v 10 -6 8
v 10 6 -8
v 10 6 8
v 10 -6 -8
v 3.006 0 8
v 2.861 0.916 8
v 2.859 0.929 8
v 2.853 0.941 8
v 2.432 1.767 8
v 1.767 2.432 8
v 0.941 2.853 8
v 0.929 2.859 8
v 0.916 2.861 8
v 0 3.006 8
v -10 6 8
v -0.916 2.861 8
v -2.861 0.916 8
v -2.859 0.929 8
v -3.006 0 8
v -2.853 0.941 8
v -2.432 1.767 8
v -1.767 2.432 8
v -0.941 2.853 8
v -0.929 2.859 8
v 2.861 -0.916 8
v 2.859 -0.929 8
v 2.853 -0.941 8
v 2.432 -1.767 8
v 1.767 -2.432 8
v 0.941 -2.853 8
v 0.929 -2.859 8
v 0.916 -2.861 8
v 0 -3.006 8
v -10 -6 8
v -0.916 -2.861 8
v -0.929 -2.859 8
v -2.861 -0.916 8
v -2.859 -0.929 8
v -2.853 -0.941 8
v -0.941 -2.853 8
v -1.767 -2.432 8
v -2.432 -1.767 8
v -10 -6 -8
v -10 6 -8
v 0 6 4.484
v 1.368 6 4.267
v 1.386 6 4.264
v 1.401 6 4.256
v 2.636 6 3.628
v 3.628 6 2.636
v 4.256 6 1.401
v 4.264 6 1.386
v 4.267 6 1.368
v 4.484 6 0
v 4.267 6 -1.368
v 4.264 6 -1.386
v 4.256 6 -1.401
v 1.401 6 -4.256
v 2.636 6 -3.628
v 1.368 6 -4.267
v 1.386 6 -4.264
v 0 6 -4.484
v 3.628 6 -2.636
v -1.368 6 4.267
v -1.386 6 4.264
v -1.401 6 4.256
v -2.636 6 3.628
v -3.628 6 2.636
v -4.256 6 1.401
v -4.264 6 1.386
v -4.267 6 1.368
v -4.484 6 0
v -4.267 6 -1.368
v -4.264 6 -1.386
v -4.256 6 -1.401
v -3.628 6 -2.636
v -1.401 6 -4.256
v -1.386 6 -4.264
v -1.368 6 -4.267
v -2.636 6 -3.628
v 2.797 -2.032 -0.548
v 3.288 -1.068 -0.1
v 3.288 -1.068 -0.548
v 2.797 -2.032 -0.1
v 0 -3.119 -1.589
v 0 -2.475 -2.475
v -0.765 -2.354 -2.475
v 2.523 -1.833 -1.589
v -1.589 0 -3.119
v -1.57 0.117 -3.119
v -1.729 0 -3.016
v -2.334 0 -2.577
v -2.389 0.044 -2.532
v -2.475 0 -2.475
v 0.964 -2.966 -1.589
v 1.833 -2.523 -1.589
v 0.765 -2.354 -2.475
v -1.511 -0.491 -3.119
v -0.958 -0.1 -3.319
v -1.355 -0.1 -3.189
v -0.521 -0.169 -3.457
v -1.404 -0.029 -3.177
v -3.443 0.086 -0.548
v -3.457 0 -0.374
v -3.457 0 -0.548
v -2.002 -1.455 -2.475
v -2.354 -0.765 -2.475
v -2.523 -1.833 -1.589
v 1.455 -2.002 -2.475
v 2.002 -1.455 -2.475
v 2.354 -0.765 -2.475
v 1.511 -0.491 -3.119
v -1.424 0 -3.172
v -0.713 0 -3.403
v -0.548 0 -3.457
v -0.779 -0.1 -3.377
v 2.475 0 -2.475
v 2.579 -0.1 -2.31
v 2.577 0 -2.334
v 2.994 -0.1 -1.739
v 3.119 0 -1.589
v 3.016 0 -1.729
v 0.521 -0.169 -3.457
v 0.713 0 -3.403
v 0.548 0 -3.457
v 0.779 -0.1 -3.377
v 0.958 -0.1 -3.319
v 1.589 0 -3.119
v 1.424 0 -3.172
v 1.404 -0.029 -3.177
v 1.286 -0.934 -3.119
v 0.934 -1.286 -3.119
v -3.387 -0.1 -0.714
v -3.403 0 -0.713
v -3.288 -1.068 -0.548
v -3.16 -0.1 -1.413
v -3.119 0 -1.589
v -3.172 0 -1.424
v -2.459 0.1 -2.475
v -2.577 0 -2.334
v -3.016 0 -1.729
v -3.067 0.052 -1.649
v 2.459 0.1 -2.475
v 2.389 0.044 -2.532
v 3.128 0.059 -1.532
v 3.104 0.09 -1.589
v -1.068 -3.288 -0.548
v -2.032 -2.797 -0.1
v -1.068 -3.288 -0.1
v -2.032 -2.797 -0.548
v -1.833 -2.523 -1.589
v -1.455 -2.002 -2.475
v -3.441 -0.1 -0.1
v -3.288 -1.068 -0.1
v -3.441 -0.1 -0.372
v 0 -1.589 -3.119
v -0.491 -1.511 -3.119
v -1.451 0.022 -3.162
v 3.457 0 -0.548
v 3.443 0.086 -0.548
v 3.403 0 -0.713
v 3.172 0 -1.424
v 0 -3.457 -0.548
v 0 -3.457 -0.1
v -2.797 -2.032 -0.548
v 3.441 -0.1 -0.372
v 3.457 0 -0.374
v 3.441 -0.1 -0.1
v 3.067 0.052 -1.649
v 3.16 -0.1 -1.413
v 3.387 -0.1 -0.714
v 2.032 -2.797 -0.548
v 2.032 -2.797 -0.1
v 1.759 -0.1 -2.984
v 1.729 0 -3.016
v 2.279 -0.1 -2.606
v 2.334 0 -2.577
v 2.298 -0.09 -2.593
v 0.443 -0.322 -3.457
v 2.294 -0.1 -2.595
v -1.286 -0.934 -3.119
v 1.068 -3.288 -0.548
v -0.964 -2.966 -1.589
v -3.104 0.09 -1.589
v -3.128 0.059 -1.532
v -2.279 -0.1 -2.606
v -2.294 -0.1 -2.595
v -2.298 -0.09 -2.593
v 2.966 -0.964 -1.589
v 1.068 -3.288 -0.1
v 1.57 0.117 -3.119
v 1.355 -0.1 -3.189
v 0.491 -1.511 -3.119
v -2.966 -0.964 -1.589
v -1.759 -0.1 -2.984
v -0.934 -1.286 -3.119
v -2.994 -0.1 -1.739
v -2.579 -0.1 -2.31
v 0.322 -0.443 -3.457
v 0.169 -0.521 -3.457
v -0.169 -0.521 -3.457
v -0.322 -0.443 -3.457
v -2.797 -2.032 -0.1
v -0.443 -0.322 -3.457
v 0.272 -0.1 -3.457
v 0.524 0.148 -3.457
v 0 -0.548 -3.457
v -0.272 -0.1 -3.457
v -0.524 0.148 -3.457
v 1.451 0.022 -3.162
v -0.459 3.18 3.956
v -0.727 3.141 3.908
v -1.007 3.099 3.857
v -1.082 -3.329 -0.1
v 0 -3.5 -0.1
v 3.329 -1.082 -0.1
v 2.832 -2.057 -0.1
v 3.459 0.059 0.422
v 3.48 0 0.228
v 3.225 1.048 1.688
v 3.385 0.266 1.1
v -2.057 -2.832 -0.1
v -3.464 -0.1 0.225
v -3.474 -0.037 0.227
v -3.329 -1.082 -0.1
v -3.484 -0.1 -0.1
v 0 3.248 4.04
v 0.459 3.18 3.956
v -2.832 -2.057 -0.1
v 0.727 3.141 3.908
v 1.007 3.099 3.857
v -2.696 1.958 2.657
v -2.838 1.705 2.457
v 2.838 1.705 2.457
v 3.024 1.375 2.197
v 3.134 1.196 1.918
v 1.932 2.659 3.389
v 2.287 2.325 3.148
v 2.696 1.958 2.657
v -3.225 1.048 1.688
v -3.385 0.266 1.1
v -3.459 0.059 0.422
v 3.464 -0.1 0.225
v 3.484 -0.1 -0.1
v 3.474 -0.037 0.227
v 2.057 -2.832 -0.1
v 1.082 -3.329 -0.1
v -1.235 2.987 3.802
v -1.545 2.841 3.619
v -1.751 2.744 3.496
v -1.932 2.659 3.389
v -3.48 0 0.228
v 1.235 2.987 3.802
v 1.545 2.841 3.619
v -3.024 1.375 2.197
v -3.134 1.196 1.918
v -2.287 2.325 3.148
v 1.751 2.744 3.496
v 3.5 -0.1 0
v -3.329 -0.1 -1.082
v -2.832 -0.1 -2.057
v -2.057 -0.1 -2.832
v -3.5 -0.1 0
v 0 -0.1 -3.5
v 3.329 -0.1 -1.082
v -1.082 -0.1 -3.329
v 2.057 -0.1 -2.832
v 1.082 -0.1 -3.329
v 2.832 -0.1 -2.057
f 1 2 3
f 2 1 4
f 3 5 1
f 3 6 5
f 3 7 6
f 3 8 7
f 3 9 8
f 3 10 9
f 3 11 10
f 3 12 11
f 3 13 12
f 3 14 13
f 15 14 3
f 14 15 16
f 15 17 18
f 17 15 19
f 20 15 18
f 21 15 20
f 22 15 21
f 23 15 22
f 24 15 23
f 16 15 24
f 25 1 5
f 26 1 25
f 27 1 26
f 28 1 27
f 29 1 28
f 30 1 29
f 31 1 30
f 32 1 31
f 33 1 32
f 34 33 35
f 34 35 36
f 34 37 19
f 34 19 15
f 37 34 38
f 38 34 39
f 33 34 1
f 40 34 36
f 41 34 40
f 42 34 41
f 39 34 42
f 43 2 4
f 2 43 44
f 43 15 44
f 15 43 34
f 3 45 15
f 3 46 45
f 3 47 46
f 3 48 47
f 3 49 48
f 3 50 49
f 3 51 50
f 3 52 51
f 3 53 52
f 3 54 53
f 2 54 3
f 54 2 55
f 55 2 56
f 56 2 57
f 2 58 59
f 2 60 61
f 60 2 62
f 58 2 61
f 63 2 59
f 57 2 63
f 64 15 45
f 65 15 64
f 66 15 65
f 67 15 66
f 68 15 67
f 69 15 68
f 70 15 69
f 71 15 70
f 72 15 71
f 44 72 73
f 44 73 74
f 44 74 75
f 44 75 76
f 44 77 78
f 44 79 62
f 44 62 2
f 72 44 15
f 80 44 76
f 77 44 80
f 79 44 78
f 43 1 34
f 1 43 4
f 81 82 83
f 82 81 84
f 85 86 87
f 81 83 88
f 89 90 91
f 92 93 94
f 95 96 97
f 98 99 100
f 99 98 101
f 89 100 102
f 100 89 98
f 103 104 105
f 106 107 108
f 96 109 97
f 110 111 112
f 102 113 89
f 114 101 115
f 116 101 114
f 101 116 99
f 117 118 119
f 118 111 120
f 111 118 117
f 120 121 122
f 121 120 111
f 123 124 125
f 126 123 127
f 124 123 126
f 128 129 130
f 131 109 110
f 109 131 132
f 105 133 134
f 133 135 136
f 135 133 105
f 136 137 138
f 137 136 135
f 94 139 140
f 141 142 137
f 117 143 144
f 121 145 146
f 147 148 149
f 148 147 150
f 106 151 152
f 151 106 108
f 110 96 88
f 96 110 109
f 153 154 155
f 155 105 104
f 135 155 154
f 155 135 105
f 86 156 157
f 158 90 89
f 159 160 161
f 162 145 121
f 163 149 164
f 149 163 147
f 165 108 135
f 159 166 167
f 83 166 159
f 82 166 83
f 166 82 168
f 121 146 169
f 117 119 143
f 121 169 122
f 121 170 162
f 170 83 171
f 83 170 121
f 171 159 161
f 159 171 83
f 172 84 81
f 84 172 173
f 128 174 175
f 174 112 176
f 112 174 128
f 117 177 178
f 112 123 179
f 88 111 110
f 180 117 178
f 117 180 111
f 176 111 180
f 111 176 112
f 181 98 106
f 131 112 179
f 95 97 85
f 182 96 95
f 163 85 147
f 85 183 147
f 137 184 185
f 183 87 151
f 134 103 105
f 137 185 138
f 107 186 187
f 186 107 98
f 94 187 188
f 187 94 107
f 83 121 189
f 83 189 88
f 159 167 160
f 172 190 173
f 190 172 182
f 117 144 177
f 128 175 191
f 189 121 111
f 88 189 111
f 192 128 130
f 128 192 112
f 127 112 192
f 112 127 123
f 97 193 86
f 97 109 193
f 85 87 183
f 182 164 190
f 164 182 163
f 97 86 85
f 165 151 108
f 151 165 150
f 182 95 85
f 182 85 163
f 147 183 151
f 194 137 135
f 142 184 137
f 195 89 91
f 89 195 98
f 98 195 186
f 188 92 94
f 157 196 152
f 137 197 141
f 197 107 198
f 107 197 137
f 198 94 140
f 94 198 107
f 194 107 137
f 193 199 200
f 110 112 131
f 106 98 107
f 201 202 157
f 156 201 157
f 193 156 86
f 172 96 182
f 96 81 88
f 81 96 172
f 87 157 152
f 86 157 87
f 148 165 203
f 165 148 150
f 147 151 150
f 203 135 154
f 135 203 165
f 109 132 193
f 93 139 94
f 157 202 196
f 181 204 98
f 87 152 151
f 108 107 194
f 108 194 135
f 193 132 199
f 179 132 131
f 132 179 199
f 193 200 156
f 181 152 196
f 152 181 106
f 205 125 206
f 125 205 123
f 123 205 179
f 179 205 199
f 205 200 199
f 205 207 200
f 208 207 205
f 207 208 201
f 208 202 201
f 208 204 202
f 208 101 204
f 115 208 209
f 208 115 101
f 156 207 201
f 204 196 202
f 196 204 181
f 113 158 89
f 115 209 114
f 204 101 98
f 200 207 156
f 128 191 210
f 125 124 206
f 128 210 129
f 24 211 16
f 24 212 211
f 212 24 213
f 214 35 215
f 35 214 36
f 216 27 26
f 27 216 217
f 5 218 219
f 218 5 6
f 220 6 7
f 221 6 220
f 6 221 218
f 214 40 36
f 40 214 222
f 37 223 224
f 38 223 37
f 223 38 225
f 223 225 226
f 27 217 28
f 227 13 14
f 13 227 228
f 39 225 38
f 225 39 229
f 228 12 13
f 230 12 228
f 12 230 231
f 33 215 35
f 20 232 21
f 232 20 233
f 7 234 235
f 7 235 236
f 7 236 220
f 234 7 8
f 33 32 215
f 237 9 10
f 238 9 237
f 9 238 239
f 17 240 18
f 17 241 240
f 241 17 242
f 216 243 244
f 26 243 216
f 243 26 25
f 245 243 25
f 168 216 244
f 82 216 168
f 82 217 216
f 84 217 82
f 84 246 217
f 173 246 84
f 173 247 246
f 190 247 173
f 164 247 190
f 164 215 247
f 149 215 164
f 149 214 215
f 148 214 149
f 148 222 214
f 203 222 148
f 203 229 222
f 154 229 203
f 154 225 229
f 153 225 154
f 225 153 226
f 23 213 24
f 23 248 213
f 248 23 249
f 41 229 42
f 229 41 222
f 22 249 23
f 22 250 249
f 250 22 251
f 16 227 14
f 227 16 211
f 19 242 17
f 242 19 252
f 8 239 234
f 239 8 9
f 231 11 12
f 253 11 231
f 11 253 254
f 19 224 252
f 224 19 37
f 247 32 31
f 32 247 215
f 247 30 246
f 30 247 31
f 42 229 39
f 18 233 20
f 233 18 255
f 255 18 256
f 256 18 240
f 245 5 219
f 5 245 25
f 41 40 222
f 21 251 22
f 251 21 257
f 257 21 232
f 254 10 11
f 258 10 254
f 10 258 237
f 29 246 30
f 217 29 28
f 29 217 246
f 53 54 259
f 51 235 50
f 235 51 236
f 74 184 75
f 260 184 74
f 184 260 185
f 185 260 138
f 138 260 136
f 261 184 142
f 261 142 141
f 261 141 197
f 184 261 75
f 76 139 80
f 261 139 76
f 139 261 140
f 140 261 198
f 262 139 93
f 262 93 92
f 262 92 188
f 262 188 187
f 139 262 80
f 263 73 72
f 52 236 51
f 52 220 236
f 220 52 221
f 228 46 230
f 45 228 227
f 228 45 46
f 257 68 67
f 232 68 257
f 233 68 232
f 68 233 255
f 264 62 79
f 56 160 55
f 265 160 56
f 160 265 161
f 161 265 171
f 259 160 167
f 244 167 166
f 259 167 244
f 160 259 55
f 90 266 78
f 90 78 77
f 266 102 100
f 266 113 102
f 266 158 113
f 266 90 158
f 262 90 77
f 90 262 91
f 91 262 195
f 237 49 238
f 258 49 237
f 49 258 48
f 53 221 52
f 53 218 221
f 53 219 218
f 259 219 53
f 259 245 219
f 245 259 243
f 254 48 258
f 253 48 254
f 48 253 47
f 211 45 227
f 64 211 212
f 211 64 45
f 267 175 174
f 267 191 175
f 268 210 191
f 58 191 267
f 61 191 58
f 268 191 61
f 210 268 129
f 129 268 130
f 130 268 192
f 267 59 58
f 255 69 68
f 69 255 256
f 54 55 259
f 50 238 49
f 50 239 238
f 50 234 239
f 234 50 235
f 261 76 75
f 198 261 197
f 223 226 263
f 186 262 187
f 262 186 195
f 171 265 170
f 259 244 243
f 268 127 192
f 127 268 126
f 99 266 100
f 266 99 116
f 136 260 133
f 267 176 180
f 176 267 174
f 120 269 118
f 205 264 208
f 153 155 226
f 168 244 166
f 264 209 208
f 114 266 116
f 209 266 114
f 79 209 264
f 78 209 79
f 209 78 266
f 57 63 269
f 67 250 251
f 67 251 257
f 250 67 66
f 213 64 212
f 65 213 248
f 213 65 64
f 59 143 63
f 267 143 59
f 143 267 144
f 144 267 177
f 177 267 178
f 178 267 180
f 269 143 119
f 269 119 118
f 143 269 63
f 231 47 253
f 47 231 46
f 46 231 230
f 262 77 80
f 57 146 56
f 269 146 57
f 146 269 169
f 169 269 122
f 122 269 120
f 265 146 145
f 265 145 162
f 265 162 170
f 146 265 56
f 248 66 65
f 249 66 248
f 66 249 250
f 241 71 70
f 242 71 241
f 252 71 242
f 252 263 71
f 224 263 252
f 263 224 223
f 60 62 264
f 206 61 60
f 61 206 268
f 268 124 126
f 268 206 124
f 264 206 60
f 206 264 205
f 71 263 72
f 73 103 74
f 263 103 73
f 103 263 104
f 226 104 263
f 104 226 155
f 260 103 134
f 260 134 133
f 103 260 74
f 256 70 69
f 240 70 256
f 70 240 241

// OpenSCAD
pellet_D = 6;
hole_D = pellet_D + 1;

W = 20;
D = 12;
H = 16;


difference() {
	#cube([W, D, H], center=true); 
	sphere (r=hole_D/2, $fn=20, center=true);
	translate([0, 0, H/4])
		cylinder (r1=hole_D/2, r2=pellet_D/2, h=H/2+0.2, $fn=20, center=true);
	
	translate([0, D/4, 0]) rotate([90, 0, 0])
		cylinder (r1=(hole_D + 2)/2, r2=hole_D/2, h=D/2+0.2, $fn=20, center=true);
}
